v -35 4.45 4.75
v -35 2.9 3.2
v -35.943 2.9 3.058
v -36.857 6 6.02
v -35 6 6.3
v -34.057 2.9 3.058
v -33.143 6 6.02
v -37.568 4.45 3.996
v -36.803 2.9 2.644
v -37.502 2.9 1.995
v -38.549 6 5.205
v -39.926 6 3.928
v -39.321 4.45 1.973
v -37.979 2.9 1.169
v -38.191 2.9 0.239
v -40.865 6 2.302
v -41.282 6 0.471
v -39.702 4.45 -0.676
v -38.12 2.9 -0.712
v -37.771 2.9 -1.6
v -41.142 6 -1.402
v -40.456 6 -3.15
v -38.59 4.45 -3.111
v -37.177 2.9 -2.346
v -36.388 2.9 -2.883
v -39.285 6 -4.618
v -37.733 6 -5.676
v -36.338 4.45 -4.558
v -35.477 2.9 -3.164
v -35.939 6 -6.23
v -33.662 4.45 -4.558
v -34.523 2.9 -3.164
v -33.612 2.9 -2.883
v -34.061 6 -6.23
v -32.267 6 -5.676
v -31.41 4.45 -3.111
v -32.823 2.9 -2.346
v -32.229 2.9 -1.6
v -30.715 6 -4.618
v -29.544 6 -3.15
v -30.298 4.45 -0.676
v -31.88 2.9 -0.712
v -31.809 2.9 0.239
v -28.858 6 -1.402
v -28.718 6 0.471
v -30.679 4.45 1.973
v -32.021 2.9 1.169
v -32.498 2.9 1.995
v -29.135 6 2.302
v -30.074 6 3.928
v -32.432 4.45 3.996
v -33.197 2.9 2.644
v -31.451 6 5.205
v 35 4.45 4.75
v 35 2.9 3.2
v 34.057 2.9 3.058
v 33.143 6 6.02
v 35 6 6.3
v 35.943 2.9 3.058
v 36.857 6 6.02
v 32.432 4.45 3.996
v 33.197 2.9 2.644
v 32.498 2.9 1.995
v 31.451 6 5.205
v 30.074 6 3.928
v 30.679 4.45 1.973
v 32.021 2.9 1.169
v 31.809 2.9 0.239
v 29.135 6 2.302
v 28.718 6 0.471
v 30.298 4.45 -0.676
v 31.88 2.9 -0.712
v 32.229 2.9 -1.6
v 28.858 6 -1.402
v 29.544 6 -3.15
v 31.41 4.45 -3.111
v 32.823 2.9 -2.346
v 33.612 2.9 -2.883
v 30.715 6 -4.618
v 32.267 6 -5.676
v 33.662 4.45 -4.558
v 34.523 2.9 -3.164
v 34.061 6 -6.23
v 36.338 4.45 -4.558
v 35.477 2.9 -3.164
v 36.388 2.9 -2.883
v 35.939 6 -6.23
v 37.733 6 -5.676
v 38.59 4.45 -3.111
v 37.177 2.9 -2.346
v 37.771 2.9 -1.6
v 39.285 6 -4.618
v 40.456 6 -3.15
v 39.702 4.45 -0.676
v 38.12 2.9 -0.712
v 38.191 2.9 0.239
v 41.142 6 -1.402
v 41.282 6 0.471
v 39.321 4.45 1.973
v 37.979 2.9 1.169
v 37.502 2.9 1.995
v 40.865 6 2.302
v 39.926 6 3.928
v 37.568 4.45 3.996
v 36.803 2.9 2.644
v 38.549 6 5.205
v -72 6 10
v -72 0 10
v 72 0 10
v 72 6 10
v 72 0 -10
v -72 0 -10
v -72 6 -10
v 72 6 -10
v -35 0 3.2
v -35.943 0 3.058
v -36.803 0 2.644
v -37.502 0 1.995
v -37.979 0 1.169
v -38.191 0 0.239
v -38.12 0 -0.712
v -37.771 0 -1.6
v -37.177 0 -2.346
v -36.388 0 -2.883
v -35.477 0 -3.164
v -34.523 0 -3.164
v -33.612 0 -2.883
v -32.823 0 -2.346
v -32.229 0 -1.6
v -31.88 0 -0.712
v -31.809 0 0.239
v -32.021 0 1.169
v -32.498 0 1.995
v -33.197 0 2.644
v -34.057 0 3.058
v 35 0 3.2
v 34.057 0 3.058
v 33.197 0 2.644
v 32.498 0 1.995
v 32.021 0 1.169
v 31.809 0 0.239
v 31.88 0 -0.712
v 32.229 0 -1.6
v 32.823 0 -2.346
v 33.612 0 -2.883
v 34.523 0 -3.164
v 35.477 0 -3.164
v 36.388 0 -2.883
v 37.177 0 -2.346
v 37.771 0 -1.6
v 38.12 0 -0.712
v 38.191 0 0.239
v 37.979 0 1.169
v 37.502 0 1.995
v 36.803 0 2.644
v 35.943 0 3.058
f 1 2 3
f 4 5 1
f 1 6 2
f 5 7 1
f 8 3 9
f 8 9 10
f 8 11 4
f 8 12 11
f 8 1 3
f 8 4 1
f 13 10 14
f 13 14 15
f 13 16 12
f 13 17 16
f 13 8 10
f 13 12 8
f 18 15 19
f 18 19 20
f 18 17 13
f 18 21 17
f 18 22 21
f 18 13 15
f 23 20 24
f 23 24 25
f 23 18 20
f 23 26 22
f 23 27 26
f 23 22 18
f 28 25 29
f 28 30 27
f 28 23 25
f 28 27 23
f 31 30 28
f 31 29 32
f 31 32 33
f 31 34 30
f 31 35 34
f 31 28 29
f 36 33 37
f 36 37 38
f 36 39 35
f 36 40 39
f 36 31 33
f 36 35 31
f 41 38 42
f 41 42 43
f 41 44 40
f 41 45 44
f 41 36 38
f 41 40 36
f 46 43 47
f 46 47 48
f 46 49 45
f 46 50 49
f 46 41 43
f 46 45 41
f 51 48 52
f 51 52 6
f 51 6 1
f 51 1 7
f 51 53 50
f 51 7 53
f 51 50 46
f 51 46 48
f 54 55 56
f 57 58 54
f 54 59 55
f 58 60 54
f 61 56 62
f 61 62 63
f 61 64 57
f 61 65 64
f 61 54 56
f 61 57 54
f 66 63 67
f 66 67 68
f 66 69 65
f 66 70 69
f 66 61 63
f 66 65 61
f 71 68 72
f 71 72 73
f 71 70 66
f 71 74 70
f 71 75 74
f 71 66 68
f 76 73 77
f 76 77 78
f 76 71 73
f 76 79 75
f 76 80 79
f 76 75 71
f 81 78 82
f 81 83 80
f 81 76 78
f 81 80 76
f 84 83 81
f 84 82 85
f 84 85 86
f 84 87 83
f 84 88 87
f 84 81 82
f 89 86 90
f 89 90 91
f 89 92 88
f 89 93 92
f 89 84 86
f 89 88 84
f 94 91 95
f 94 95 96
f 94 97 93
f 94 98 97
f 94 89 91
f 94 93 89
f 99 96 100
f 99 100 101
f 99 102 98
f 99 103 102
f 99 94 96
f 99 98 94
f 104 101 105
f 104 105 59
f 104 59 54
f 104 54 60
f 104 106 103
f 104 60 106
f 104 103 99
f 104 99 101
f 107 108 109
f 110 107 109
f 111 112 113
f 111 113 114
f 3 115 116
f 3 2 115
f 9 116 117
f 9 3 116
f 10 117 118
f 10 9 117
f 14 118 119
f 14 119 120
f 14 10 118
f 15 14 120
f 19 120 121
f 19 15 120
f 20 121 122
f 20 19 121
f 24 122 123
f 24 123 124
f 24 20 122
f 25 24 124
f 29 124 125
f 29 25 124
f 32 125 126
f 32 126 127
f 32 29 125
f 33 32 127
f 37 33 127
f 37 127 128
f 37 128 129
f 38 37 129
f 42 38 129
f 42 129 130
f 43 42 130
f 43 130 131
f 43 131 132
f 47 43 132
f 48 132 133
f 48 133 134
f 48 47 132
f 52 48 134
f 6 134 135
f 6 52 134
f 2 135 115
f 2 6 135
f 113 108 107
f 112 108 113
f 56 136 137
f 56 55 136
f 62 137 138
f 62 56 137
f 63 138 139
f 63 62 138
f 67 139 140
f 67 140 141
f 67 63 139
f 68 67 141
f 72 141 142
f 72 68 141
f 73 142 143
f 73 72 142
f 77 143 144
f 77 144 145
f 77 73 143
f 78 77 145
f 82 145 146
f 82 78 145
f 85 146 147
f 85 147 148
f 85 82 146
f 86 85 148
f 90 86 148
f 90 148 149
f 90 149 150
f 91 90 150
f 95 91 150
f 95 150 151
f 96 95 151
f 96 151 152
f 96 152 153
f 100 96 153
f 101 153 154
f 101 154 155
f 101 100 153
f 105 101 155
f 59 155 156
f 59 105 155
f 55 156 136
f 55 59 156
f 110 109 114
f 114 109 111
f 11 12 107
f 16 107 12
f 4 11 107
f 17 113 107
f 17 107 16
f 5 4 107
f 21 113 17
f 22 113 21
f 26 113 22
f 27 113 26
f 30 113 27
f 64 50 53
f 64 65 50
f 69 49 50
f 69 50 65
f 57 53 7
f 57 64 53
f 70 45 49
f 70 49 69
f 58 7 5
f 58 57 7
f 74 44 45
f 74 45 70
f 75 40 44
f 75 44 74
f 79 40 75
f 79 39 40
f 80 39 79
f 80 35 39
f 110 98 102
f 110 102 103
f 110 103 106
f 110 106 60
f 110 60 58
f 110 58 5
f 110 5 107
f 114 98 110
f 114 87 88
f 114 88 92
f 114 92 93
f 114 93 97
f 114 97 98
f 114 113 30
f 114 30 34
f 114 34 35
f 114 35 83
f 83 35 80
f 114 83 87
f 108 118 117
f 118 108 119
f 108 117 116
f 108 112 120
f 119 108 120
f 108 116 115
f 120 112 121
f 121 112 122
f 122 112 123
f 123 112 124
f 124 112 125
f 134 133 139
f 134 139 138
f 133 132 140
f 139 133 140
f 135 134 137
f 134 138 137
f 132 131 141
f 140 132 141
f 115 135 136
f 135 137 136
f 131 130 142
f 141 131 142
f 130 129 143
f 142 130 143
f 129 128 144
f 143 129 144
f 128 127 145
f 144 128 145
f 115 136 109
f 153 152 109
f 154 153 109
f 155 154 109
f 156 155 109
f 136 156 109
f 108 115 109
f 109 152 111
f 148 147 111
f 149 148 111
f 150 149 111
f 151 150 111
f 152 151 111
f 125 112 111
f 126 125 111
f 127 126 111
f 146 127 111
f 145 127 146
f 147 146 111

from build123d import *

# Parameters (mm, degrees)
SKETCH1_W           = 144
SKETCH1_H           = 20
BOSS_EXTRUDE1_DEPTH = 6
HOLE1_AT_2_COUNT    = 2
HOLE1_AT_2_PITCH    = 70


with BuildPart() as part:
    # Sketch1 → Boss-Extrude1 (new body)
    with BuildSketch(Plane(origin=(0, 0, 0), x_dir=(1, 0, 0), z_dir=(0, 1, 0))):
        Rectangle(SKETCH1_W, SKETCH1_H)
    extrude(amount=BOSS_EXTRUDE1_DEPTH)

    # Sketch3 → Hole1 (revolve, cut)
    with BuildSketch(Plane(origin=(-35, 6, 0), x_dir=(0, 0, 1), z_dir=(1, 0, 0))):
        Polygon((0, 0), (0, 6), (3.2, 6), (3.2, 3.1), (6.3, 0), align=None)
    hole1 = revolve(axis=Axis((-35, 20.308894879, 0), (0, -1, 0)), mode=Mode.SUBTRACT)

    # Hole1 at 2: Hole1 ×2
    with Locations(*[(i * HOLE1_AT_2_PITCH, 0, 0) for i in range(1, HOLE1_AT_2_COUNT)]):
        add(hole1, mode=Mode.SUBTRACT)


solid = part.part
